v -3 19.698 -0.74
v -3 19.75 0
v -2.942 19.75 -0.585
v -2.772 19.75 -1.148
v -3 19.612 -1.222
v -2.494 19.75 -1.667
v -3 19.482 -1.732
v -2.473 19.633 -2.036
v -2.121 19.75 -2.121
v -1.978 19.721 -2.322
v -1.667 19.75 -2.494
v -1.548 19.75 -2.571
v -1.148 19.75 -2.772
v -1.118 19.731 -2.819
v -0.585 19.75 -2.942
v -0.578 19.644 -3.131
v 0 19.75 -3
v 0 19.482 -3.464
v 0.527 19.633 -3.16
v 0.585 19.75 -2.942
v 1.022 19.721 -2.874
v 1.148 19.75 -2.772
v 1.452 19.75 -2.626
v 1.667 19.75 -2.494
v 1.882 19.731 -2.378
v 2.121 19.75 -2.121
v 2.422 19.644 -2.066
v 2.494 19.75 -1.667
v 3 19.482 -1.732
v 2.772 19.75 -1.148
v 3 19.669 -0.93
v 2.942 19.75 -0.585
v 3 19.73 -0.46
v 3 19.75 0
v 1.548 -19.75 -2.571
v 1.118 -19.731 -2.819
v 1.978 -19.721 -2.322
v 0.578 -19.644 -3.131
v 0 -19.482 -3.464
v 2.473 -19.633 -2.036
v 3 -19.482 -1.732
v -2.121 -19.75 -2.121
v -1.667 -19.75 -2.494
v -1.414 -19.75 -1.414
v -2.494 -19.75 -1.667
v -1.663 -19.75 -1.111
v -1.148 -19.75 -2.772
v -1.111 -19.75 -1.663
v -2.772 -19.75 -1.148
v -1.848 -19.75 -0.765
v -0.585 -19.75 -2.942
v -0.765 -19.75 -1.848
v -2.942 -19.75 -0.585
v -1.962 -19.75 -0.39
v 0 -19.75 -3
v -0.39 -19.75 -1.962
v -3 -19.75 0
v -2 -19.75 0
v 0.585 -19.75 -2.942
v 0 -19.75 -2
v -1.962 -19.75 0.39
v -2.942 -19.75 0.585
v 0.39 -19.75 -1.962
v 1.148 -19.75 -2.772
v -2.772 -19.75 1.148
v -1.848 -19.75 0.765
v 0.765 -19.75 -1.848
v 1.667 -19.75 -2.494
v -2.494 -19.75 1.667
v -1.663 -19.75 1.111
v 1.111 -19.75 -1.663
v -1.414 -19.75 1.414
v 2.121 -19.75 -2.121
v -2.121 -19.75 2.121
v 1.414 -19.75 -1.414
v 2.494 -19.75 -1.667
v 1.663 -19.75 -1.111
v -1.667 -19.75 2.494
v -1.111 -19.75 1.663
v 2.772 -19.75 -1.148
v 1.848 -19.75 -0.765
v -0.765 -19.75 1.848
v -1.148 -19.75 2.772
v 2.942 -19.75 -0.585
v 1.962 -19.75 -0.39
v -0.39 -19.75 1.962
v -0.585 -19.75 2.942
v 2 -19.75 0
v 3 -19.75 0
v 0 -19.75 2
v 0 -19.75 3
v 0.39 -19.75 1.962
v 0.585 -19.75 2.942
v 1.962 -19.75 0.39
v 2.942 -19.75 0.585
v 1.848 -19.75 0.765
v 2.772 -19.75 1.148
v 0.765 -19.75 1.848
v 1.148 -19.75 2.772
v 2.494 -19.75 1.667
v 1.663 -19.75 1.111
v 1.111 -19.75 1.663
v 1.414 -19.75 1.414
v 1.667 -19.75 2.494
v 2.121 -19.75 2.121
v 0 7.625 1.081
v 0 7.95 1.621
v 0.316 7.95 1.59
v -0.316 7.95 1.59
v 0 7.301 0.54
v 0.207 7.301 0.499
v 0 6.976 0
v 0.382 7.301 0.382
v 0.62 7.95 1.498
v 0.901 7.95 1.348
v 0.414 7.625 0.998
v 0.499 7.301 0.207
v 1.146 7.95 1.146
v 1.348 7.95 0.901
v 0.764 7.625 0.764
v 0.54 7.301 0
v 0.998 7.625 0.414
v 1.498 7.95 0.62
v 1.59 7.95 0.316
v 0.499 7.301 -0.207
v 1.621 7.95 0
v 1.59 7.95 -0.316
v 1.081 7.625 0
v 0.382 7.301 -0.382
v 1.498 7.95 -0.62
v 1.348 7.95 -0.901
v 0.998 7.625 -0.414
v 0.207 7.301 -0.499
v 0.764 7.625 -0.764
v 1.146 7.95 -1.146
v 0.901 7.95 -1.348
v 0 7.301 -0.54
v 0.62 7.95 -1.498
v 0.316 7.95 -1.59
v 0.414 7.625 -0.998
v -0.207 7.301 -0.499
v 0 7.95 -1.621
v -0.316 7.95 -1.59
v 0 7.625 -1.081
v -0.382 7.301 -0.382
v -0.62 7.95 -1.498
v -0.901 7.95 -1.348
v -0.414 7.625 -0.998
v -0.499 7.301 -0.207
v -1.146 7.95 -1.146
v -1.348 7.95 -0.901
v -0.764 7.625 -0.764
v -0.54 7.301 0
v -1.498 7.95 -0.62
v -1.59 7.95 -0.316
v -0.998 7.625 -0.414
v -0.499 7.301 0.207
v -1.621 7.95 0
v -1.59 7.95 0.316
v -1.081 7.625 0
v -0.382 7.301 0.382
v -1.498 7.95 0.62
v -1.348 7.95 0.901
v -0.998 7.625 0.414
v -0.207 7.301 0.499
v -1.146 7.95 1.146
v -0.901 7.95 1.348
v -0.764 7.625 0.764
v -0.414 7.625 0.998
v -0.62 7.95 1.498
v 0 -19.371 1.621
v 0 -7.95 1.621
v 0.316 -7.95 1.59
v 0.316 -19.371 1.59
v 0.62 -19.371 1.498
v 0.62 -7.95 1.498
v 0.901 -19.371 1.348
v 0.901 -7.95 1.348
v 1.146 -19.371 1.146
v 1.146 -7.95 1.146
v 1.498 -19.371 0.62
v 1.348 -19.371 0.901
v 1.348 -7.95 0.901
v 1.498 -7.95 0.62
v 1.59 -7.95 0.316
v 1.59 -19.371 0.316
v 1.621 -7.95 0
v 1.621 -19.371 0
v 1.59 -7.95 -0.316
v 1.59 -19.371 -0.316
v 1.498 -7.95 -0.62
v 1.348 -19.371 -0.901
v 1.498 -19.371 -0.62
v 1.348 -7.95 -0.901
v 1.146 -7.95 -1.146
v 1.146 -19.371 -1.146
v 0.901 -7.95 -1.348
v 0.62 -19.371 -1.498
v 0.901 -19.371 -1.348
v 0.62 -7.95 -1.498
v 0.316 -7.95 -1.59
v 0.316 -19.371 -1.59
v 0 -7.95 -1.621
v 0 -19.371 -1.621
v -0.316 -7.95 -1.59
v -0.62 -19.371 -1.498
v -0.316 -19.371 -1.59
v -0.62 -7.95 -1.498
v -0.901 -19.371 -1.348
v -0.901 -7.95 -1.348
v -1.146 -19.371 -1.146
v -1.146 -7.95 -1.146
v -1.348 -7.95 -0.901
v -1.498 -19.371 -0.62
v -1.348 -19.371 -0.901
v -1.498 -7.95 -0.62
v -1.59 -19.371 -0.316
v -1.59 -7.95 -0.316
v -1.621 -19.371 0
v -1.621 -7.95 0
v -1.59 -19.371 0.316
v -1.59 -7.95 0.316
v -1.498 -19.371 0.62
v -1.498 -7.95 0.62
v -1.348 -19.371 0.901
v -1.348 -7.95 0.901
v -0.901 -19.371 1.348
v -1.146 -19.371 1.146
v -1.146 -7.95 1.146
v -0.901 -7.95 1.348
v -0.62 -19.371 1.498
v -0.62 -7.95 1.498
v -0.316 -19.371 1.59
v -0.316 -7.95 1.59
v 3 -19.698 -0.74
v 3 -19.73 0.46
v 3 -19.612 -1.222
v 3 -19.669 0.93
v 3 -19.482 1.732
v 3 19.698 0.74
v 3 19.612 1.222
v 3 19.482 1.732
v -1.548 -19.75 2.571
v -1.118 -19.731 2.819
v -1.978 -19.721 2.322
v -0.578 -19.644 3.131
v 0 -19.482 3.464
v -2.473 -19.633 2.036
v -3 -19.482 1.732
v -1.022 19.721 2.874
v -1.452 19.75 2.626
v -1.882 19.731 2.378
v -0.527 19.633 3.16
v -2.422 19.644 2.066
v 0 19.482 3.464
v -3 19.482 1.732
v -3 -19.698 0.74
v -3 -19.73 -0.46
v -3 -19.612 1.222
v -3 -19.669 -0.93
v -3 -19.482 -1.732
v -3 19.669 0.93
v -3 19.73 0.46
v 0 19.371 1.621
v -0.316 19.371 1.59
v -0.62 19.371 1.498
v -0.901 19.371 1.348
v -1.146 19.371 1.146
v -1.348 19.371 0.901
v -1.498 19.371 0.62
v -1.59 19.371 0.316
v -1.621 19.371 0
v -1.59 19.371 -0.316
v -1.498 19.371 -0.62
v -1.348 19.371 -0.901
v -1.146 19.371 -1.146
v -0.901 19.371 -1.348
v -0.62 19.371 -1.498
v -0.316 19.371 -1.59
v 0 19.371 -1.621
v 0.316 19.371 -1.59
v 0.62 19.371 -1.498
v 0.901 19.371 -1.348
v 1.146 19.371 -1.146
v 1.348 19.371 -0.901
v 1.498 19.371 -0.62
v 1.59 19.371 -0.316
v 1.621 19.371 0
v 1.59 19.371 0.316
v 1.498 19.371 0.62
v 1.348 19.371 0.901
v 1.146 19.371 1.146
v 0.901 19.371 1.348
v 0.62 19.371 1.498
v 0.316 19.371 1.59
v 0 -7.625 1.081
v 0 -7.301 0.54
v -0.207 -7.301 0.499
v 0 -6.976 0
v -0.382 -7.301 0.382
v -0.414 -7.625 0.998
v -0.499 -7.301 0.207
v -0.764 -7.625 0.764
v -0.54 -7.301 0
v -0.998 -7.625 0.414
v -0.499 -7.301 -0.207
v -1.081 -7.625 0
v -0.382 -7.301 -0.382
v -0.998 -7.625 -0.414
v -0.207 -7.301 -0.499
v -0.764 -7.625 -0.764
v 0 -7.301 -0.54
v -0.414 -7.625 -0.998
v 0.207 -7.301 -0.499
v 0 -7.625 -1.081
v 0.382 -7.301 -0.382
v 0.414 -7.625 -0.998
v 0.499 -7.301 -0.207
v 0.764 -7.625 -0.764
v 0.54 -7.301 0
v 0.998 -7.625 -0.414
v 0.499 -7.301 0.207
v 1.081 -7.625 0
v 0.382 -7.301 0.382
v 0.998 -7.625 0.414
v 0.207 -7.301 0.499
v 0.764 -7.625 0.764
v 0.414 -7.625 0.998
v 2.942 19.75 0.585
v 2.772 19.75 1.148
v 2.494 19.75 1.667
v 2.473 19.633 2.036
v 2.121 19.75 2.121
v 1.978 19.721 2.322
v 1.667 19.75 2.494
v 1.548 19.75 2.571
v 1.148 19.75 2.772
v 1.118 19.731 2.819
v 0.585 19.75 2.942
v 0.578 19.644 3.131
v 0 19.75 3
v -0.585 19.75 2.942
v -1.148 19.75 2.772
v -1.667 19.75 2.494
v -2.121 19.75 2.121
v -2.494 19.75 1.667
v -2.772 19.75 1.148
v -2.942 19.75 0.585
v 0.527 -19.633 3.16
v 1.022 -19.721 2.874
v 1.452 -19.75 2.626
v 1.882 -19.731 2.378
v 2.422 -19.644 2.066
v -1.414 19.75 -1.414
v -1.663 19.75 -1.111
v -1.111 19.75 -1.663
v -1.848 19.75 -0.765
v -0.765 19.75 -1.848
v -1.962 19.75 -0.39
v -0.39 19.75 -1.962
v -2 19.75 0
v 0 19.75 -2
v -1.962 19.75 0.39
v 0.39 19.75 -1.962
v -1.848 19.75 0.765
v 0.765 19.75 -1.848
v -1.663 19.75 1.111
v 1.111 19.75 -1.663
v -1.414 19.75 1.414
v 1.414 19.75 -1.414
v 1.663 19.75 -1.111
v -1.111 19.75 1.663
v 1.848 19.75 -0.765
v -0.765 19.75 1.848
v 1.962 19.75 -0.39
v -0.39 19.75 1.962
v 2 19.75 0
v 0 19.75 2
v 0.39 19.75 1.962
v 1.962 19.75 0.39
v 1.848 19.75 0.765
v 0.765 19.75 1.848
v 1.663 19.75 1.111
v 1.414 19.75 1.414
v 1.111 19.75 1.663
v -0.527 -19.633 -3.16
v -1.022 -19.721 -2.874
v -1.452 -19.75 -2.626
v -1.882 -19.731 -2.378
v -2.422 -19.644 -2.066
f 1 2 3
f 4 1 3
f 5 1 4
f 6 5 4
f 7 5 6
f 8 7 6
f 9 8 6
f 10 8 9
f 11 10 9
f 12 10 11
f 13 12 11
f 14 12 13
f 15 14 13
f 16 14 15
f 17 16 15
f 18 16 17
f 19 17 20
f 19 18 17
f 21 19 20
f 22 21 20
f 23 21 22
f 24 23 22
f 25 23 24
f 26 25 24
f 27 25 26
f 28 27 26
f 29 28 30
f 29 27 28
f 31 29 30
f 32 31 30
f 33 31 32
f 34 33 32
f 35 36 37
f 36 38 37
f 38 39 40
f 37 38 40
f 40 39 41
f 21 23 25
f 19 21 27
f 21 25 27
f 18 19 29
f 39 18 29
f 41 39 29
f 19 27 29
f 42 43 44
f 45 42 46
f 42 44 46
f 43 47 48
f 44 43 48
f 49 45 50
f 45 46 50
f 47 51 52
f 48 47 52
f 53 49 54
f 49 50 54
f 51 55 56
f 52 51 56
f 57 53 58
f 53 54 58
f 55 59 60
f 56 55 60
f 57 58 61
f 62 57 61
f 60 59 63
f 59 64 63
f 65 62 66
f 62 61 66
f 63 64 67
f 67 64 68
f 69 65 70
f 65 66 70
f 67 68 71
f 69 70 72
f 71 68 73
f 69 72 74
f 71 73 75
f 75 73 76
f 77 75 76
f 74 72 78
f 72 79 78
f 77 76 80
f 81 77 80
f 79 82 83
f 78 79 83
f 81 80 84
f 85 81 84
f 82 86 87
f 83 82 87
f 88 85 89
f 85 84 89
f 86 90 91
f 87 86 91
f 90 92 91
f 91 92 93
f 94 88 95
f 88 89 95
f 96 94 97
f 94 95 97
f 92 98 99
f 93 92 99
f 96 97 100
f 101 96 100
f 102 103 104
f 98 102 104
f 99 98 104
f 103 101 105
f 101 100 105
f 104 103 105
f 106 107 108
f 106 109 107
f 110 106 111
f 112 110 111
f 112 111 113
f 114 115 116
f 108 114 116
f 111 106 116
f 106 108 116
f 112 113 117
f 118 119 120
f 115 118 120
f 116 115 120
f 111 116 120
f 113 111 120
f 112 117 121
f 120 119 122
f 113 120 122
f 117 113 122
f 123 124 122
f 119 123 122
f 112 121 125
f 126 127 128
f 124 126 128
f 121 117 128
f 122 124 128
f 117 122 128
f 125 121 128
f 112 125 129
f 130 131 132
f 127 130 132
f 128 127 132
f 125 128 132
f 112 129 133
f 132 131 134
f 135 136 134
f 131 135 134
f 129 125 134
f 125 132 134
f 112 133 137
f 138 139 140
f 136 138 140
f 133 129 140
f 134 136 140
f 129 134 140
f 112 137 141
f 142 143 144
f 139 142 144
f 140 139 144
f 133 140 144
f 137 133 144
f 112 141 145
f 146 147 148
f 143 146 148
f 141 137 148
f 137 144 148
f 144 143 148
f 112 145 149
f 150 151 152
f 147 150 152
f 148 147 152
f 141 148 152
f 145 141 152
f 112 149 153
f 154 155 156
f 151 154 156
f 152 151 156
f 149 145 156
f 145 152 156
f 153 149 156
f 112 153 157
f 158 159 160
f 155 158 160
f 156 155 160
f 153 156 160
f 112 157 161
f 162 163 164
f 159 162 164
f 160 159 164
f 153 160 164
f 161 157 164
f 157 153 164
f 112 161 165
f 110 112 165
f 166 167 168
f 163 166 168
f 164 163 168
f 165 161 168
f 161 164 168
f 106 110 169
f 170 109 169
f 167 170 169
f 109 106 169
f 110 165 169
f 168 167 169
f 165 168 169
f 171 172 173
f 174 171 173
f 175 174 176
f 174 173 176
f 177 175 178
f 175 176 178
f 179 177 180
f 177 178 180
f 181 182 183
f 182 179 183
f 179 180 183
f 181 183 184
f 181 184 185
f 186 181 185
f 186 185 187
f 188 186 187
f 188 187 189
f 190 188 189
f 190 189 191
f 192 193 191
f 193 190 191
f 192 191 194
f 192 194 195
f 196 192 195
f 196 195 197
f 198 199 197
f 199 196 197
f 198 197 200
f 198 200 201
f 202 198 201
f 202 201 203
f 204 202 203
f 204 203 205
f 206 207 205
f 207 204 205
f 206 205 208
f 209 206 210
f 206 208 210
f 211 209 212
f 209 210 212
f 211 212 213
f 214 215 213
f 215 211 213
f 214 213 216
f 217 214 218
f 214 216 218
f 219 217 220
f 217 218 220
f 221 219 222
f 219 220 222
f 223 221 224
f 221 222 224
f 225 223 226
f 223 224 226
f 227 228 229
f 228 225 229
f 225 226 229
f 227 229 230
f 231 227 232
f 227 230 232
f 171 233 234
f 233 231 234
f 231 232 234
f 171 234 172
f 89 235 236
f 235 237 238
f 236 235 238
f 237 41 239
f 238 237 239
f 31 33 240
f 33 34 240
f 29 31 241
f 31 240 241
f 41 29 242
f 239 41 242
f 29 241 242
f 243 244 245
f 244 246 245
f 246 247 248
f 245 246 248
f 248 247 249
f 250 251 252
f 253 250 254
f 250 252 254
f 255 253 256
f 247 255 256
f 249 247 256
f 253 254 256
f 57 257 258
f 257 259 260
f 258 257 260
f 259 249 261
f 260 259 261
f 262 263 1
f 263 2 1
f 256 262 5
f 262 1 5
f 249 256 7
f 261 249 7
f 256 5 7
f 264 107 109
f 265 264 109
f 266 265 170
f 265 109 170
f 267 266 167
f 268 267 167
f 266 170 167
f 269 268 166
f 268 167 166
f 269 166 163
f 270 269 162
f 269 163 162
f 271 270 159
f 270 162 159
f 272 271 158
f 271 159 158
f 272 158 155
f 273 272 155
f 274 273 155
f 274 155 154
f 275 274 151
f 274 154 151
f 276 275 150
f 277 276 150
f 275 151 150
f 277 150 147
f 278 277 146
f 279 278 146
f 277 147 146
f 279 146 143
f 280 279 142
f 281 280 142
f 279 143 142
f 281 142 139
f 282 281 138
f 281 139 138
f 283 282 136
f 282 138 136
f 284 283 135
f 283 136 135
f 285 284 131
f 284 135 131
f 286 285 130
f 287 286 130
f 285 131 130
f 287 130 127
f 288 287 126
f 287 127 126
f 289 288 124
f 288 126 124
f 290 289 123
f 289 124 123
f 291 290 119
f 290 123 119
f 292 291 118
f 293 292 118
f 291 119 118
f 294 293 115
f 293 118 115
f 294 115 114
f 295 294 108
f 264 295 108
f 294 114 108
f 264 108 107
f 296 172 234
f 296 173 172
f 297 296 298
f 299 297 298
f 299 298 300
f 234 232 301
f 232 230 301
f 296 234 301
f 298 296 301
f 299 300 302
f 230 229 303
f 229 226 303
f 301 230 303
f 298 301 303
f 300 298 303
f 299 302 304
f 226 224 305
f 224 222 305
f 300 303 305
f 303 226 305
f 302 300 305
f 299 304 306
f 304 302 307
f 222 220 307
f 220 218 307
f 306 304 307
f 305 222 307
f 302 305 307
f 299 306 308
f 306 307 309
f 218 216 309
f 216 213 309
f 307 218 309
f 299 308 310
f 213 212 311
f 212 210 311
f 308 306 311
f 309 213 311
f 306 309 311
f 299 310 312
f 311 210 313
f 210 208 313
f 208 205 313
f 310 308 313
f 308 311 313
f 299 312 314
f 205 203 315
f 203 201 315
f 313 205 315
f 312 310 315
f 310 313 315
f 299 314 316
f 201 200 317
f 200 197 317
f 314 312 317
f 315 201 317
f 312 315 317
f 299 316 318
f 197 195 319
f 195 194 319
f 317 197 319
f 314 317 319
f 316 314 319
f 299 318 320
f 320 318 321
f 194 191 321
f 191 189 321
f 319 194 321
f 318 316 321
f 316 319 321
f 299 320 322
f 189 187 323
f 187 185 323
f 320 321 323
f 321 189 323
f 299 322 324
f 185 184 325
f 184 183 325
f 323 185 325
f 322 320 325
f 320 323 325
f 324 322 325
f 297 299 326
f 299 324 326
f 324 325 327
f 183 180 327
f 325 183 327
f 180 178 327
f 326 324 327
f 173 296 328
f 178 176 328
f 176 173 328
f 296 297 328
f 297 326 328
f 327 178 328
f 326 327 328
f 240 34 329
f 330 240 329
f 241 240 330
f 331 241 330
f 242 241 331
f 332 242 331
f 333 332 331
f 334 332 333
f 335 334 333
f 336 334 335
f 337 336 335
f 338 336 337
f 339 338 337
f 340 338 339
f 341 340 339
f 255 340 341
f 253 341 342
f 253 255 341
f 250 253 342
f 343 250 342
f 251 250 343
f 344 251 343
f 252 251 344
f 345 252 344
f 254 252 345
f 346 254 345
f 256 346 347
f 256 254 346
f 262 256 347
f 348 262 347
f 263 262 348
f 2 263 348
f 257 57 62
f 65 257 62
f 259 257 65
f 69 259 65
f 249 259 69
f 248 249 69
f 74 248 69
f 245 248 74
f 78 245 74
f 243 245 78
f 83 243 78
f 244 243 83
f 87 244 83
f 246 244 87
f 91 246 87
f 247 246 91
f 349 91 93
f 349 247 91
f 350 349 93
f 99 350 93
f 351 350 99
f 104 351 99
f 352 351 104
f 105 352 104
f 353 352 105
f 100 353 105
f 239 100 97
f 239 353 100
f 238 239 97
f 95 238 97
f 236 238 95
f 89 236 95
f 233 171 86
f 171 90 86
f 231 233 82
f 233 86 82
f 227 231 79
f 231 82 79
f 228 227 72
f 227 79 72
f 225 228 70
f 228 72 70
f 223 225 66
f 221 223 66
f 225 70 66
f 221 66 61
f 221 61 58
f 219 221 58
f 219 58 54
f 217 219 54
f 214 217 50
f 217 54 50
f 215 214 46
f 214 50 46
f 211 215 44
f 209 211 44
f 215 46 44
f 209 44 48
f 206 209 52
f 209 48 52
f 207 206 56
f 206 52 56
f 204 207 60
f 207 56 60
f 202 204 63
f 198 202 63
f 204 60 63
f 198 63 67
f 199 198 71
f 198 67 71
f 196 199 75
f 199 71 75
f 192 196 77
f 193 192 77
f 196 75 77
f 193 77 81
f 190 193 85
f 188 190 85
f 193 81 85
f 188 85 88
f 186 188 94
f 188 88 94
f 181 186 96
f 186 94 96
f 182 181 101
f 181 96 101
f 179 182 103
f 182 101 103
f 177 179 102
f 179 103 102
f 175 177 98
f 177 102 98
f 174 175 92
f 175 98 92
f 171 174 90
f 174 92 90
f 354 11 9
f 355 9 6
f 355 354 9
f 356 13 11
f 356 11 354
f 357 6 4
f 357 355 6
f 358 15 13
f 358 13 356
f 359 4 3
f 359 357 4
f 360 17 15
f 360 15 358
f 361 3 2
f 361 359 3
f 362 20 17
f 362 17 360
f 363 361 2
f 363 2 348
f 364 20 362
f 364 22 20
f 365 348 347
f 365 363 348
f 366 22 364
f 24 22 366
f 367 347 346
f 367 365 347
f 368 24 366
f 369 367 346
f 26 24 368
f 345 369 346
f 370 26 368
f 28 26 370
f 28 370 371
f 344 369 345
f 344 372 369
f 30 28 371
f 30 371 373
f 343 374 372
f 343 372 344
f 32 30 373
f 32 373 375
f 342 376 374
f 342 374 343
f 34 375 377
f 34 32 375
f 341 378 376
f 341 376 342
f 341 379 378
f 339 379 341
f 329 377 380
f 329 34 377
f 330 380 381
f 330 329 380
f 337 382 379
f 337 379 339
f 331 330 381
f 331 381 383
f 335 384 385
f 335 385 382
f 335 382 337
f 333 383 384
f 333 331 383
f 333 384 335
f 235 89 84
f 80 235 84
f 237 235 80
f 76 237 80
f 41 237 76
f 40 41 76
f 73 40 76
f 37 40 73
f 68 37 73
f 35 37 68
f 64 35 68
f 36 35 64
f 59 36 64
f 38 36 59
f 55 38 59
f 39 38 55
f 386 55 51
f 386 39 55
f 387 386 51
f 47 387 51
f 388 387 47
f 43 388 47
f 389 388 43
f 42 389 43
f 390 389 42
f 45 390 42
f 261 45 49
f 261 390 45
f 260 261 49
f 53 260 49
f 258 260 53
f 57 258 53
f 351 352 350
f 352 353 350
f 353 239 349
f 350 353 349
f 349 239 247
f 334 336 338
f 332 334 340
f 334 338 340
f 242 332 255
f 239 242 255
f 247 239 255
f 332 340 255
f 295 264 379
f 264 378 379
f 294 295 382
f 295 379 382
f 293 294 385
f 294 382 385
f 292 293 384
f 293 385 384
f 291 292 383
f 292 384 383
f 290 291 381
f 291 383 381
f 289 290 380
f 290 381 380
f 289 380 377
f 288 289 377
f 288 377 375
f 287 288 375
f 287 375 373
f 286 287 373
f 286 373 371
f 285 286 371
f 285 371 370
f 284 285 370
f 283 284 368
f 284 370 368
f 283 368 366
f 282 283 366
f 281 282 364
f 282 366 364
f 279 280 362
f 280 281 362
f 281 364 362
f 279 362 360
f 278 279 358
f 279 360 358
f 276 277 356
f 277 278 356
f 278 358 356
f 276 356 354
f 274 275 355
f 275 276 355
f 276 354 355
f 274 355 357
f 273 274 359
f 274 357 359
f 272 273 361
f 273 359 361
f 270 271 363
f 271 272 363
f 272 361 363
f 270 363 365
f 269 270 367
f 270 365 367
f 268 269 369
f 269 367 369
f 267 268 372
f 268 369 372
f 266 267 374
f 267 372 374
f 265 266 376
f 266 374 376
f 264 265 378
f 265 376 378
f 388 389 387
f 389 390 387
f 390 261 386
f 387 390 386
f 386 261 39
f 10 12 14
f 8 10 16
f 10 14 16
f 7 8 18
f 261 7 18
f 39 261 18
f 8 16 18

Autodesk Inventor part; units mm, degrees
ref_plane "YZ Plane" through (0, 0, 0) normal (1, 0, 0) x (0, 1, 0)
ref_plane "XZ Plane" through (0, 0, 0) normal (0, 1, 0) x (-1, 0, 0)
ref_plane "XY Plane" through (0, 0, 0) normal (0, 0, 1) x (1, 0, 0)
sketch "スケッチ1" plane through (0, 0, 0) normal (1, 0, 0) x (0, 1, 0)
  line L0 (-19.75, 0) -> (19.75, 0)
  line L1 (0, 0) -> (0, 3.4641) construction
  line L2 (-19.4821, 3.4641) -> (-19.75, 3)
  line L3 (-19.75, 3) -> (-19.75, 0)
  line L4 (-19.4821, 3.4641) -> (19.4821, 3.4641)
  line L5 (19.4821, 3.4641) -> (19.75, 3)
  line L6 (19.75, 3) -> (19.75, 0)
  dimension "d1" = 3
  dimension "d2" = 3.4641
  dimension "d3" = 30
  dimension "d4" = 39.5
revolve "回転1" add sketch "スケッチ1" angle 360 about axis through (0, -19.75, 0) along (0, 1, 0)
sketch "スケッチ2" plane through (0, 19.75, 0) normal (0, 1, 0) x (1, 0, 0)
  circle A0 centre (0, 0) radius 3.4641 projected
  line L0 (0, -3.4641) -> (-3, -1.7321)
  line L1 (-3, -1.7321) -> (-3, 1.7321)
  line L2 (-3, 1.7321) -> (0, 3.4641)
  line L3 (0, 3.4641) -> (3, 1.7321)
  line L4 (3, 1.7321) -> (3, -1.7321)
  line L5 (3, -1.7321) -> (0, -3.4641)
  point P0 (0, 0)
  point P1 (0, 0)
  point P2 (3, -1.7321)
  point P3 (3, -1.7321)
  point P4 (3, 1.7321)
  point P5 (3, 1.7321)
  point P6 (0, 3.4641)
  point P7 (0, 3.4641)
  point P8 (-3, 1.7321)
  point P9 (-3, 1.7321)
  point P10 (-3, -1.7321)
  point P11 (-3, -1.7321)
  point P12 (0, 0)
extrude "押し出し1" cut sketch "スケッチ2" against normal through all contours A0 L4 | L3 A0 | A0 L5 | L2 A0 | A0 L0 | L1 A0
hole "穴1" at (0, 19.75, 0) direction (0, -1, 0) diameter 3.242 depth 11.8 tip angle 118 countersink diameter 4 countersink angle 90 thread size "M4x0.7" class "6H" standard "ISO Metric profile"
mirror "ミラー1" about plane through (0, 0, 0) normal (0, 1, 0) of "穴1"
equation "\"d2\" = 1.1547 * d1"
properties part number "SLSBF6-39.5-M4-N4" material "ステンレス鋼 AISI 304"
